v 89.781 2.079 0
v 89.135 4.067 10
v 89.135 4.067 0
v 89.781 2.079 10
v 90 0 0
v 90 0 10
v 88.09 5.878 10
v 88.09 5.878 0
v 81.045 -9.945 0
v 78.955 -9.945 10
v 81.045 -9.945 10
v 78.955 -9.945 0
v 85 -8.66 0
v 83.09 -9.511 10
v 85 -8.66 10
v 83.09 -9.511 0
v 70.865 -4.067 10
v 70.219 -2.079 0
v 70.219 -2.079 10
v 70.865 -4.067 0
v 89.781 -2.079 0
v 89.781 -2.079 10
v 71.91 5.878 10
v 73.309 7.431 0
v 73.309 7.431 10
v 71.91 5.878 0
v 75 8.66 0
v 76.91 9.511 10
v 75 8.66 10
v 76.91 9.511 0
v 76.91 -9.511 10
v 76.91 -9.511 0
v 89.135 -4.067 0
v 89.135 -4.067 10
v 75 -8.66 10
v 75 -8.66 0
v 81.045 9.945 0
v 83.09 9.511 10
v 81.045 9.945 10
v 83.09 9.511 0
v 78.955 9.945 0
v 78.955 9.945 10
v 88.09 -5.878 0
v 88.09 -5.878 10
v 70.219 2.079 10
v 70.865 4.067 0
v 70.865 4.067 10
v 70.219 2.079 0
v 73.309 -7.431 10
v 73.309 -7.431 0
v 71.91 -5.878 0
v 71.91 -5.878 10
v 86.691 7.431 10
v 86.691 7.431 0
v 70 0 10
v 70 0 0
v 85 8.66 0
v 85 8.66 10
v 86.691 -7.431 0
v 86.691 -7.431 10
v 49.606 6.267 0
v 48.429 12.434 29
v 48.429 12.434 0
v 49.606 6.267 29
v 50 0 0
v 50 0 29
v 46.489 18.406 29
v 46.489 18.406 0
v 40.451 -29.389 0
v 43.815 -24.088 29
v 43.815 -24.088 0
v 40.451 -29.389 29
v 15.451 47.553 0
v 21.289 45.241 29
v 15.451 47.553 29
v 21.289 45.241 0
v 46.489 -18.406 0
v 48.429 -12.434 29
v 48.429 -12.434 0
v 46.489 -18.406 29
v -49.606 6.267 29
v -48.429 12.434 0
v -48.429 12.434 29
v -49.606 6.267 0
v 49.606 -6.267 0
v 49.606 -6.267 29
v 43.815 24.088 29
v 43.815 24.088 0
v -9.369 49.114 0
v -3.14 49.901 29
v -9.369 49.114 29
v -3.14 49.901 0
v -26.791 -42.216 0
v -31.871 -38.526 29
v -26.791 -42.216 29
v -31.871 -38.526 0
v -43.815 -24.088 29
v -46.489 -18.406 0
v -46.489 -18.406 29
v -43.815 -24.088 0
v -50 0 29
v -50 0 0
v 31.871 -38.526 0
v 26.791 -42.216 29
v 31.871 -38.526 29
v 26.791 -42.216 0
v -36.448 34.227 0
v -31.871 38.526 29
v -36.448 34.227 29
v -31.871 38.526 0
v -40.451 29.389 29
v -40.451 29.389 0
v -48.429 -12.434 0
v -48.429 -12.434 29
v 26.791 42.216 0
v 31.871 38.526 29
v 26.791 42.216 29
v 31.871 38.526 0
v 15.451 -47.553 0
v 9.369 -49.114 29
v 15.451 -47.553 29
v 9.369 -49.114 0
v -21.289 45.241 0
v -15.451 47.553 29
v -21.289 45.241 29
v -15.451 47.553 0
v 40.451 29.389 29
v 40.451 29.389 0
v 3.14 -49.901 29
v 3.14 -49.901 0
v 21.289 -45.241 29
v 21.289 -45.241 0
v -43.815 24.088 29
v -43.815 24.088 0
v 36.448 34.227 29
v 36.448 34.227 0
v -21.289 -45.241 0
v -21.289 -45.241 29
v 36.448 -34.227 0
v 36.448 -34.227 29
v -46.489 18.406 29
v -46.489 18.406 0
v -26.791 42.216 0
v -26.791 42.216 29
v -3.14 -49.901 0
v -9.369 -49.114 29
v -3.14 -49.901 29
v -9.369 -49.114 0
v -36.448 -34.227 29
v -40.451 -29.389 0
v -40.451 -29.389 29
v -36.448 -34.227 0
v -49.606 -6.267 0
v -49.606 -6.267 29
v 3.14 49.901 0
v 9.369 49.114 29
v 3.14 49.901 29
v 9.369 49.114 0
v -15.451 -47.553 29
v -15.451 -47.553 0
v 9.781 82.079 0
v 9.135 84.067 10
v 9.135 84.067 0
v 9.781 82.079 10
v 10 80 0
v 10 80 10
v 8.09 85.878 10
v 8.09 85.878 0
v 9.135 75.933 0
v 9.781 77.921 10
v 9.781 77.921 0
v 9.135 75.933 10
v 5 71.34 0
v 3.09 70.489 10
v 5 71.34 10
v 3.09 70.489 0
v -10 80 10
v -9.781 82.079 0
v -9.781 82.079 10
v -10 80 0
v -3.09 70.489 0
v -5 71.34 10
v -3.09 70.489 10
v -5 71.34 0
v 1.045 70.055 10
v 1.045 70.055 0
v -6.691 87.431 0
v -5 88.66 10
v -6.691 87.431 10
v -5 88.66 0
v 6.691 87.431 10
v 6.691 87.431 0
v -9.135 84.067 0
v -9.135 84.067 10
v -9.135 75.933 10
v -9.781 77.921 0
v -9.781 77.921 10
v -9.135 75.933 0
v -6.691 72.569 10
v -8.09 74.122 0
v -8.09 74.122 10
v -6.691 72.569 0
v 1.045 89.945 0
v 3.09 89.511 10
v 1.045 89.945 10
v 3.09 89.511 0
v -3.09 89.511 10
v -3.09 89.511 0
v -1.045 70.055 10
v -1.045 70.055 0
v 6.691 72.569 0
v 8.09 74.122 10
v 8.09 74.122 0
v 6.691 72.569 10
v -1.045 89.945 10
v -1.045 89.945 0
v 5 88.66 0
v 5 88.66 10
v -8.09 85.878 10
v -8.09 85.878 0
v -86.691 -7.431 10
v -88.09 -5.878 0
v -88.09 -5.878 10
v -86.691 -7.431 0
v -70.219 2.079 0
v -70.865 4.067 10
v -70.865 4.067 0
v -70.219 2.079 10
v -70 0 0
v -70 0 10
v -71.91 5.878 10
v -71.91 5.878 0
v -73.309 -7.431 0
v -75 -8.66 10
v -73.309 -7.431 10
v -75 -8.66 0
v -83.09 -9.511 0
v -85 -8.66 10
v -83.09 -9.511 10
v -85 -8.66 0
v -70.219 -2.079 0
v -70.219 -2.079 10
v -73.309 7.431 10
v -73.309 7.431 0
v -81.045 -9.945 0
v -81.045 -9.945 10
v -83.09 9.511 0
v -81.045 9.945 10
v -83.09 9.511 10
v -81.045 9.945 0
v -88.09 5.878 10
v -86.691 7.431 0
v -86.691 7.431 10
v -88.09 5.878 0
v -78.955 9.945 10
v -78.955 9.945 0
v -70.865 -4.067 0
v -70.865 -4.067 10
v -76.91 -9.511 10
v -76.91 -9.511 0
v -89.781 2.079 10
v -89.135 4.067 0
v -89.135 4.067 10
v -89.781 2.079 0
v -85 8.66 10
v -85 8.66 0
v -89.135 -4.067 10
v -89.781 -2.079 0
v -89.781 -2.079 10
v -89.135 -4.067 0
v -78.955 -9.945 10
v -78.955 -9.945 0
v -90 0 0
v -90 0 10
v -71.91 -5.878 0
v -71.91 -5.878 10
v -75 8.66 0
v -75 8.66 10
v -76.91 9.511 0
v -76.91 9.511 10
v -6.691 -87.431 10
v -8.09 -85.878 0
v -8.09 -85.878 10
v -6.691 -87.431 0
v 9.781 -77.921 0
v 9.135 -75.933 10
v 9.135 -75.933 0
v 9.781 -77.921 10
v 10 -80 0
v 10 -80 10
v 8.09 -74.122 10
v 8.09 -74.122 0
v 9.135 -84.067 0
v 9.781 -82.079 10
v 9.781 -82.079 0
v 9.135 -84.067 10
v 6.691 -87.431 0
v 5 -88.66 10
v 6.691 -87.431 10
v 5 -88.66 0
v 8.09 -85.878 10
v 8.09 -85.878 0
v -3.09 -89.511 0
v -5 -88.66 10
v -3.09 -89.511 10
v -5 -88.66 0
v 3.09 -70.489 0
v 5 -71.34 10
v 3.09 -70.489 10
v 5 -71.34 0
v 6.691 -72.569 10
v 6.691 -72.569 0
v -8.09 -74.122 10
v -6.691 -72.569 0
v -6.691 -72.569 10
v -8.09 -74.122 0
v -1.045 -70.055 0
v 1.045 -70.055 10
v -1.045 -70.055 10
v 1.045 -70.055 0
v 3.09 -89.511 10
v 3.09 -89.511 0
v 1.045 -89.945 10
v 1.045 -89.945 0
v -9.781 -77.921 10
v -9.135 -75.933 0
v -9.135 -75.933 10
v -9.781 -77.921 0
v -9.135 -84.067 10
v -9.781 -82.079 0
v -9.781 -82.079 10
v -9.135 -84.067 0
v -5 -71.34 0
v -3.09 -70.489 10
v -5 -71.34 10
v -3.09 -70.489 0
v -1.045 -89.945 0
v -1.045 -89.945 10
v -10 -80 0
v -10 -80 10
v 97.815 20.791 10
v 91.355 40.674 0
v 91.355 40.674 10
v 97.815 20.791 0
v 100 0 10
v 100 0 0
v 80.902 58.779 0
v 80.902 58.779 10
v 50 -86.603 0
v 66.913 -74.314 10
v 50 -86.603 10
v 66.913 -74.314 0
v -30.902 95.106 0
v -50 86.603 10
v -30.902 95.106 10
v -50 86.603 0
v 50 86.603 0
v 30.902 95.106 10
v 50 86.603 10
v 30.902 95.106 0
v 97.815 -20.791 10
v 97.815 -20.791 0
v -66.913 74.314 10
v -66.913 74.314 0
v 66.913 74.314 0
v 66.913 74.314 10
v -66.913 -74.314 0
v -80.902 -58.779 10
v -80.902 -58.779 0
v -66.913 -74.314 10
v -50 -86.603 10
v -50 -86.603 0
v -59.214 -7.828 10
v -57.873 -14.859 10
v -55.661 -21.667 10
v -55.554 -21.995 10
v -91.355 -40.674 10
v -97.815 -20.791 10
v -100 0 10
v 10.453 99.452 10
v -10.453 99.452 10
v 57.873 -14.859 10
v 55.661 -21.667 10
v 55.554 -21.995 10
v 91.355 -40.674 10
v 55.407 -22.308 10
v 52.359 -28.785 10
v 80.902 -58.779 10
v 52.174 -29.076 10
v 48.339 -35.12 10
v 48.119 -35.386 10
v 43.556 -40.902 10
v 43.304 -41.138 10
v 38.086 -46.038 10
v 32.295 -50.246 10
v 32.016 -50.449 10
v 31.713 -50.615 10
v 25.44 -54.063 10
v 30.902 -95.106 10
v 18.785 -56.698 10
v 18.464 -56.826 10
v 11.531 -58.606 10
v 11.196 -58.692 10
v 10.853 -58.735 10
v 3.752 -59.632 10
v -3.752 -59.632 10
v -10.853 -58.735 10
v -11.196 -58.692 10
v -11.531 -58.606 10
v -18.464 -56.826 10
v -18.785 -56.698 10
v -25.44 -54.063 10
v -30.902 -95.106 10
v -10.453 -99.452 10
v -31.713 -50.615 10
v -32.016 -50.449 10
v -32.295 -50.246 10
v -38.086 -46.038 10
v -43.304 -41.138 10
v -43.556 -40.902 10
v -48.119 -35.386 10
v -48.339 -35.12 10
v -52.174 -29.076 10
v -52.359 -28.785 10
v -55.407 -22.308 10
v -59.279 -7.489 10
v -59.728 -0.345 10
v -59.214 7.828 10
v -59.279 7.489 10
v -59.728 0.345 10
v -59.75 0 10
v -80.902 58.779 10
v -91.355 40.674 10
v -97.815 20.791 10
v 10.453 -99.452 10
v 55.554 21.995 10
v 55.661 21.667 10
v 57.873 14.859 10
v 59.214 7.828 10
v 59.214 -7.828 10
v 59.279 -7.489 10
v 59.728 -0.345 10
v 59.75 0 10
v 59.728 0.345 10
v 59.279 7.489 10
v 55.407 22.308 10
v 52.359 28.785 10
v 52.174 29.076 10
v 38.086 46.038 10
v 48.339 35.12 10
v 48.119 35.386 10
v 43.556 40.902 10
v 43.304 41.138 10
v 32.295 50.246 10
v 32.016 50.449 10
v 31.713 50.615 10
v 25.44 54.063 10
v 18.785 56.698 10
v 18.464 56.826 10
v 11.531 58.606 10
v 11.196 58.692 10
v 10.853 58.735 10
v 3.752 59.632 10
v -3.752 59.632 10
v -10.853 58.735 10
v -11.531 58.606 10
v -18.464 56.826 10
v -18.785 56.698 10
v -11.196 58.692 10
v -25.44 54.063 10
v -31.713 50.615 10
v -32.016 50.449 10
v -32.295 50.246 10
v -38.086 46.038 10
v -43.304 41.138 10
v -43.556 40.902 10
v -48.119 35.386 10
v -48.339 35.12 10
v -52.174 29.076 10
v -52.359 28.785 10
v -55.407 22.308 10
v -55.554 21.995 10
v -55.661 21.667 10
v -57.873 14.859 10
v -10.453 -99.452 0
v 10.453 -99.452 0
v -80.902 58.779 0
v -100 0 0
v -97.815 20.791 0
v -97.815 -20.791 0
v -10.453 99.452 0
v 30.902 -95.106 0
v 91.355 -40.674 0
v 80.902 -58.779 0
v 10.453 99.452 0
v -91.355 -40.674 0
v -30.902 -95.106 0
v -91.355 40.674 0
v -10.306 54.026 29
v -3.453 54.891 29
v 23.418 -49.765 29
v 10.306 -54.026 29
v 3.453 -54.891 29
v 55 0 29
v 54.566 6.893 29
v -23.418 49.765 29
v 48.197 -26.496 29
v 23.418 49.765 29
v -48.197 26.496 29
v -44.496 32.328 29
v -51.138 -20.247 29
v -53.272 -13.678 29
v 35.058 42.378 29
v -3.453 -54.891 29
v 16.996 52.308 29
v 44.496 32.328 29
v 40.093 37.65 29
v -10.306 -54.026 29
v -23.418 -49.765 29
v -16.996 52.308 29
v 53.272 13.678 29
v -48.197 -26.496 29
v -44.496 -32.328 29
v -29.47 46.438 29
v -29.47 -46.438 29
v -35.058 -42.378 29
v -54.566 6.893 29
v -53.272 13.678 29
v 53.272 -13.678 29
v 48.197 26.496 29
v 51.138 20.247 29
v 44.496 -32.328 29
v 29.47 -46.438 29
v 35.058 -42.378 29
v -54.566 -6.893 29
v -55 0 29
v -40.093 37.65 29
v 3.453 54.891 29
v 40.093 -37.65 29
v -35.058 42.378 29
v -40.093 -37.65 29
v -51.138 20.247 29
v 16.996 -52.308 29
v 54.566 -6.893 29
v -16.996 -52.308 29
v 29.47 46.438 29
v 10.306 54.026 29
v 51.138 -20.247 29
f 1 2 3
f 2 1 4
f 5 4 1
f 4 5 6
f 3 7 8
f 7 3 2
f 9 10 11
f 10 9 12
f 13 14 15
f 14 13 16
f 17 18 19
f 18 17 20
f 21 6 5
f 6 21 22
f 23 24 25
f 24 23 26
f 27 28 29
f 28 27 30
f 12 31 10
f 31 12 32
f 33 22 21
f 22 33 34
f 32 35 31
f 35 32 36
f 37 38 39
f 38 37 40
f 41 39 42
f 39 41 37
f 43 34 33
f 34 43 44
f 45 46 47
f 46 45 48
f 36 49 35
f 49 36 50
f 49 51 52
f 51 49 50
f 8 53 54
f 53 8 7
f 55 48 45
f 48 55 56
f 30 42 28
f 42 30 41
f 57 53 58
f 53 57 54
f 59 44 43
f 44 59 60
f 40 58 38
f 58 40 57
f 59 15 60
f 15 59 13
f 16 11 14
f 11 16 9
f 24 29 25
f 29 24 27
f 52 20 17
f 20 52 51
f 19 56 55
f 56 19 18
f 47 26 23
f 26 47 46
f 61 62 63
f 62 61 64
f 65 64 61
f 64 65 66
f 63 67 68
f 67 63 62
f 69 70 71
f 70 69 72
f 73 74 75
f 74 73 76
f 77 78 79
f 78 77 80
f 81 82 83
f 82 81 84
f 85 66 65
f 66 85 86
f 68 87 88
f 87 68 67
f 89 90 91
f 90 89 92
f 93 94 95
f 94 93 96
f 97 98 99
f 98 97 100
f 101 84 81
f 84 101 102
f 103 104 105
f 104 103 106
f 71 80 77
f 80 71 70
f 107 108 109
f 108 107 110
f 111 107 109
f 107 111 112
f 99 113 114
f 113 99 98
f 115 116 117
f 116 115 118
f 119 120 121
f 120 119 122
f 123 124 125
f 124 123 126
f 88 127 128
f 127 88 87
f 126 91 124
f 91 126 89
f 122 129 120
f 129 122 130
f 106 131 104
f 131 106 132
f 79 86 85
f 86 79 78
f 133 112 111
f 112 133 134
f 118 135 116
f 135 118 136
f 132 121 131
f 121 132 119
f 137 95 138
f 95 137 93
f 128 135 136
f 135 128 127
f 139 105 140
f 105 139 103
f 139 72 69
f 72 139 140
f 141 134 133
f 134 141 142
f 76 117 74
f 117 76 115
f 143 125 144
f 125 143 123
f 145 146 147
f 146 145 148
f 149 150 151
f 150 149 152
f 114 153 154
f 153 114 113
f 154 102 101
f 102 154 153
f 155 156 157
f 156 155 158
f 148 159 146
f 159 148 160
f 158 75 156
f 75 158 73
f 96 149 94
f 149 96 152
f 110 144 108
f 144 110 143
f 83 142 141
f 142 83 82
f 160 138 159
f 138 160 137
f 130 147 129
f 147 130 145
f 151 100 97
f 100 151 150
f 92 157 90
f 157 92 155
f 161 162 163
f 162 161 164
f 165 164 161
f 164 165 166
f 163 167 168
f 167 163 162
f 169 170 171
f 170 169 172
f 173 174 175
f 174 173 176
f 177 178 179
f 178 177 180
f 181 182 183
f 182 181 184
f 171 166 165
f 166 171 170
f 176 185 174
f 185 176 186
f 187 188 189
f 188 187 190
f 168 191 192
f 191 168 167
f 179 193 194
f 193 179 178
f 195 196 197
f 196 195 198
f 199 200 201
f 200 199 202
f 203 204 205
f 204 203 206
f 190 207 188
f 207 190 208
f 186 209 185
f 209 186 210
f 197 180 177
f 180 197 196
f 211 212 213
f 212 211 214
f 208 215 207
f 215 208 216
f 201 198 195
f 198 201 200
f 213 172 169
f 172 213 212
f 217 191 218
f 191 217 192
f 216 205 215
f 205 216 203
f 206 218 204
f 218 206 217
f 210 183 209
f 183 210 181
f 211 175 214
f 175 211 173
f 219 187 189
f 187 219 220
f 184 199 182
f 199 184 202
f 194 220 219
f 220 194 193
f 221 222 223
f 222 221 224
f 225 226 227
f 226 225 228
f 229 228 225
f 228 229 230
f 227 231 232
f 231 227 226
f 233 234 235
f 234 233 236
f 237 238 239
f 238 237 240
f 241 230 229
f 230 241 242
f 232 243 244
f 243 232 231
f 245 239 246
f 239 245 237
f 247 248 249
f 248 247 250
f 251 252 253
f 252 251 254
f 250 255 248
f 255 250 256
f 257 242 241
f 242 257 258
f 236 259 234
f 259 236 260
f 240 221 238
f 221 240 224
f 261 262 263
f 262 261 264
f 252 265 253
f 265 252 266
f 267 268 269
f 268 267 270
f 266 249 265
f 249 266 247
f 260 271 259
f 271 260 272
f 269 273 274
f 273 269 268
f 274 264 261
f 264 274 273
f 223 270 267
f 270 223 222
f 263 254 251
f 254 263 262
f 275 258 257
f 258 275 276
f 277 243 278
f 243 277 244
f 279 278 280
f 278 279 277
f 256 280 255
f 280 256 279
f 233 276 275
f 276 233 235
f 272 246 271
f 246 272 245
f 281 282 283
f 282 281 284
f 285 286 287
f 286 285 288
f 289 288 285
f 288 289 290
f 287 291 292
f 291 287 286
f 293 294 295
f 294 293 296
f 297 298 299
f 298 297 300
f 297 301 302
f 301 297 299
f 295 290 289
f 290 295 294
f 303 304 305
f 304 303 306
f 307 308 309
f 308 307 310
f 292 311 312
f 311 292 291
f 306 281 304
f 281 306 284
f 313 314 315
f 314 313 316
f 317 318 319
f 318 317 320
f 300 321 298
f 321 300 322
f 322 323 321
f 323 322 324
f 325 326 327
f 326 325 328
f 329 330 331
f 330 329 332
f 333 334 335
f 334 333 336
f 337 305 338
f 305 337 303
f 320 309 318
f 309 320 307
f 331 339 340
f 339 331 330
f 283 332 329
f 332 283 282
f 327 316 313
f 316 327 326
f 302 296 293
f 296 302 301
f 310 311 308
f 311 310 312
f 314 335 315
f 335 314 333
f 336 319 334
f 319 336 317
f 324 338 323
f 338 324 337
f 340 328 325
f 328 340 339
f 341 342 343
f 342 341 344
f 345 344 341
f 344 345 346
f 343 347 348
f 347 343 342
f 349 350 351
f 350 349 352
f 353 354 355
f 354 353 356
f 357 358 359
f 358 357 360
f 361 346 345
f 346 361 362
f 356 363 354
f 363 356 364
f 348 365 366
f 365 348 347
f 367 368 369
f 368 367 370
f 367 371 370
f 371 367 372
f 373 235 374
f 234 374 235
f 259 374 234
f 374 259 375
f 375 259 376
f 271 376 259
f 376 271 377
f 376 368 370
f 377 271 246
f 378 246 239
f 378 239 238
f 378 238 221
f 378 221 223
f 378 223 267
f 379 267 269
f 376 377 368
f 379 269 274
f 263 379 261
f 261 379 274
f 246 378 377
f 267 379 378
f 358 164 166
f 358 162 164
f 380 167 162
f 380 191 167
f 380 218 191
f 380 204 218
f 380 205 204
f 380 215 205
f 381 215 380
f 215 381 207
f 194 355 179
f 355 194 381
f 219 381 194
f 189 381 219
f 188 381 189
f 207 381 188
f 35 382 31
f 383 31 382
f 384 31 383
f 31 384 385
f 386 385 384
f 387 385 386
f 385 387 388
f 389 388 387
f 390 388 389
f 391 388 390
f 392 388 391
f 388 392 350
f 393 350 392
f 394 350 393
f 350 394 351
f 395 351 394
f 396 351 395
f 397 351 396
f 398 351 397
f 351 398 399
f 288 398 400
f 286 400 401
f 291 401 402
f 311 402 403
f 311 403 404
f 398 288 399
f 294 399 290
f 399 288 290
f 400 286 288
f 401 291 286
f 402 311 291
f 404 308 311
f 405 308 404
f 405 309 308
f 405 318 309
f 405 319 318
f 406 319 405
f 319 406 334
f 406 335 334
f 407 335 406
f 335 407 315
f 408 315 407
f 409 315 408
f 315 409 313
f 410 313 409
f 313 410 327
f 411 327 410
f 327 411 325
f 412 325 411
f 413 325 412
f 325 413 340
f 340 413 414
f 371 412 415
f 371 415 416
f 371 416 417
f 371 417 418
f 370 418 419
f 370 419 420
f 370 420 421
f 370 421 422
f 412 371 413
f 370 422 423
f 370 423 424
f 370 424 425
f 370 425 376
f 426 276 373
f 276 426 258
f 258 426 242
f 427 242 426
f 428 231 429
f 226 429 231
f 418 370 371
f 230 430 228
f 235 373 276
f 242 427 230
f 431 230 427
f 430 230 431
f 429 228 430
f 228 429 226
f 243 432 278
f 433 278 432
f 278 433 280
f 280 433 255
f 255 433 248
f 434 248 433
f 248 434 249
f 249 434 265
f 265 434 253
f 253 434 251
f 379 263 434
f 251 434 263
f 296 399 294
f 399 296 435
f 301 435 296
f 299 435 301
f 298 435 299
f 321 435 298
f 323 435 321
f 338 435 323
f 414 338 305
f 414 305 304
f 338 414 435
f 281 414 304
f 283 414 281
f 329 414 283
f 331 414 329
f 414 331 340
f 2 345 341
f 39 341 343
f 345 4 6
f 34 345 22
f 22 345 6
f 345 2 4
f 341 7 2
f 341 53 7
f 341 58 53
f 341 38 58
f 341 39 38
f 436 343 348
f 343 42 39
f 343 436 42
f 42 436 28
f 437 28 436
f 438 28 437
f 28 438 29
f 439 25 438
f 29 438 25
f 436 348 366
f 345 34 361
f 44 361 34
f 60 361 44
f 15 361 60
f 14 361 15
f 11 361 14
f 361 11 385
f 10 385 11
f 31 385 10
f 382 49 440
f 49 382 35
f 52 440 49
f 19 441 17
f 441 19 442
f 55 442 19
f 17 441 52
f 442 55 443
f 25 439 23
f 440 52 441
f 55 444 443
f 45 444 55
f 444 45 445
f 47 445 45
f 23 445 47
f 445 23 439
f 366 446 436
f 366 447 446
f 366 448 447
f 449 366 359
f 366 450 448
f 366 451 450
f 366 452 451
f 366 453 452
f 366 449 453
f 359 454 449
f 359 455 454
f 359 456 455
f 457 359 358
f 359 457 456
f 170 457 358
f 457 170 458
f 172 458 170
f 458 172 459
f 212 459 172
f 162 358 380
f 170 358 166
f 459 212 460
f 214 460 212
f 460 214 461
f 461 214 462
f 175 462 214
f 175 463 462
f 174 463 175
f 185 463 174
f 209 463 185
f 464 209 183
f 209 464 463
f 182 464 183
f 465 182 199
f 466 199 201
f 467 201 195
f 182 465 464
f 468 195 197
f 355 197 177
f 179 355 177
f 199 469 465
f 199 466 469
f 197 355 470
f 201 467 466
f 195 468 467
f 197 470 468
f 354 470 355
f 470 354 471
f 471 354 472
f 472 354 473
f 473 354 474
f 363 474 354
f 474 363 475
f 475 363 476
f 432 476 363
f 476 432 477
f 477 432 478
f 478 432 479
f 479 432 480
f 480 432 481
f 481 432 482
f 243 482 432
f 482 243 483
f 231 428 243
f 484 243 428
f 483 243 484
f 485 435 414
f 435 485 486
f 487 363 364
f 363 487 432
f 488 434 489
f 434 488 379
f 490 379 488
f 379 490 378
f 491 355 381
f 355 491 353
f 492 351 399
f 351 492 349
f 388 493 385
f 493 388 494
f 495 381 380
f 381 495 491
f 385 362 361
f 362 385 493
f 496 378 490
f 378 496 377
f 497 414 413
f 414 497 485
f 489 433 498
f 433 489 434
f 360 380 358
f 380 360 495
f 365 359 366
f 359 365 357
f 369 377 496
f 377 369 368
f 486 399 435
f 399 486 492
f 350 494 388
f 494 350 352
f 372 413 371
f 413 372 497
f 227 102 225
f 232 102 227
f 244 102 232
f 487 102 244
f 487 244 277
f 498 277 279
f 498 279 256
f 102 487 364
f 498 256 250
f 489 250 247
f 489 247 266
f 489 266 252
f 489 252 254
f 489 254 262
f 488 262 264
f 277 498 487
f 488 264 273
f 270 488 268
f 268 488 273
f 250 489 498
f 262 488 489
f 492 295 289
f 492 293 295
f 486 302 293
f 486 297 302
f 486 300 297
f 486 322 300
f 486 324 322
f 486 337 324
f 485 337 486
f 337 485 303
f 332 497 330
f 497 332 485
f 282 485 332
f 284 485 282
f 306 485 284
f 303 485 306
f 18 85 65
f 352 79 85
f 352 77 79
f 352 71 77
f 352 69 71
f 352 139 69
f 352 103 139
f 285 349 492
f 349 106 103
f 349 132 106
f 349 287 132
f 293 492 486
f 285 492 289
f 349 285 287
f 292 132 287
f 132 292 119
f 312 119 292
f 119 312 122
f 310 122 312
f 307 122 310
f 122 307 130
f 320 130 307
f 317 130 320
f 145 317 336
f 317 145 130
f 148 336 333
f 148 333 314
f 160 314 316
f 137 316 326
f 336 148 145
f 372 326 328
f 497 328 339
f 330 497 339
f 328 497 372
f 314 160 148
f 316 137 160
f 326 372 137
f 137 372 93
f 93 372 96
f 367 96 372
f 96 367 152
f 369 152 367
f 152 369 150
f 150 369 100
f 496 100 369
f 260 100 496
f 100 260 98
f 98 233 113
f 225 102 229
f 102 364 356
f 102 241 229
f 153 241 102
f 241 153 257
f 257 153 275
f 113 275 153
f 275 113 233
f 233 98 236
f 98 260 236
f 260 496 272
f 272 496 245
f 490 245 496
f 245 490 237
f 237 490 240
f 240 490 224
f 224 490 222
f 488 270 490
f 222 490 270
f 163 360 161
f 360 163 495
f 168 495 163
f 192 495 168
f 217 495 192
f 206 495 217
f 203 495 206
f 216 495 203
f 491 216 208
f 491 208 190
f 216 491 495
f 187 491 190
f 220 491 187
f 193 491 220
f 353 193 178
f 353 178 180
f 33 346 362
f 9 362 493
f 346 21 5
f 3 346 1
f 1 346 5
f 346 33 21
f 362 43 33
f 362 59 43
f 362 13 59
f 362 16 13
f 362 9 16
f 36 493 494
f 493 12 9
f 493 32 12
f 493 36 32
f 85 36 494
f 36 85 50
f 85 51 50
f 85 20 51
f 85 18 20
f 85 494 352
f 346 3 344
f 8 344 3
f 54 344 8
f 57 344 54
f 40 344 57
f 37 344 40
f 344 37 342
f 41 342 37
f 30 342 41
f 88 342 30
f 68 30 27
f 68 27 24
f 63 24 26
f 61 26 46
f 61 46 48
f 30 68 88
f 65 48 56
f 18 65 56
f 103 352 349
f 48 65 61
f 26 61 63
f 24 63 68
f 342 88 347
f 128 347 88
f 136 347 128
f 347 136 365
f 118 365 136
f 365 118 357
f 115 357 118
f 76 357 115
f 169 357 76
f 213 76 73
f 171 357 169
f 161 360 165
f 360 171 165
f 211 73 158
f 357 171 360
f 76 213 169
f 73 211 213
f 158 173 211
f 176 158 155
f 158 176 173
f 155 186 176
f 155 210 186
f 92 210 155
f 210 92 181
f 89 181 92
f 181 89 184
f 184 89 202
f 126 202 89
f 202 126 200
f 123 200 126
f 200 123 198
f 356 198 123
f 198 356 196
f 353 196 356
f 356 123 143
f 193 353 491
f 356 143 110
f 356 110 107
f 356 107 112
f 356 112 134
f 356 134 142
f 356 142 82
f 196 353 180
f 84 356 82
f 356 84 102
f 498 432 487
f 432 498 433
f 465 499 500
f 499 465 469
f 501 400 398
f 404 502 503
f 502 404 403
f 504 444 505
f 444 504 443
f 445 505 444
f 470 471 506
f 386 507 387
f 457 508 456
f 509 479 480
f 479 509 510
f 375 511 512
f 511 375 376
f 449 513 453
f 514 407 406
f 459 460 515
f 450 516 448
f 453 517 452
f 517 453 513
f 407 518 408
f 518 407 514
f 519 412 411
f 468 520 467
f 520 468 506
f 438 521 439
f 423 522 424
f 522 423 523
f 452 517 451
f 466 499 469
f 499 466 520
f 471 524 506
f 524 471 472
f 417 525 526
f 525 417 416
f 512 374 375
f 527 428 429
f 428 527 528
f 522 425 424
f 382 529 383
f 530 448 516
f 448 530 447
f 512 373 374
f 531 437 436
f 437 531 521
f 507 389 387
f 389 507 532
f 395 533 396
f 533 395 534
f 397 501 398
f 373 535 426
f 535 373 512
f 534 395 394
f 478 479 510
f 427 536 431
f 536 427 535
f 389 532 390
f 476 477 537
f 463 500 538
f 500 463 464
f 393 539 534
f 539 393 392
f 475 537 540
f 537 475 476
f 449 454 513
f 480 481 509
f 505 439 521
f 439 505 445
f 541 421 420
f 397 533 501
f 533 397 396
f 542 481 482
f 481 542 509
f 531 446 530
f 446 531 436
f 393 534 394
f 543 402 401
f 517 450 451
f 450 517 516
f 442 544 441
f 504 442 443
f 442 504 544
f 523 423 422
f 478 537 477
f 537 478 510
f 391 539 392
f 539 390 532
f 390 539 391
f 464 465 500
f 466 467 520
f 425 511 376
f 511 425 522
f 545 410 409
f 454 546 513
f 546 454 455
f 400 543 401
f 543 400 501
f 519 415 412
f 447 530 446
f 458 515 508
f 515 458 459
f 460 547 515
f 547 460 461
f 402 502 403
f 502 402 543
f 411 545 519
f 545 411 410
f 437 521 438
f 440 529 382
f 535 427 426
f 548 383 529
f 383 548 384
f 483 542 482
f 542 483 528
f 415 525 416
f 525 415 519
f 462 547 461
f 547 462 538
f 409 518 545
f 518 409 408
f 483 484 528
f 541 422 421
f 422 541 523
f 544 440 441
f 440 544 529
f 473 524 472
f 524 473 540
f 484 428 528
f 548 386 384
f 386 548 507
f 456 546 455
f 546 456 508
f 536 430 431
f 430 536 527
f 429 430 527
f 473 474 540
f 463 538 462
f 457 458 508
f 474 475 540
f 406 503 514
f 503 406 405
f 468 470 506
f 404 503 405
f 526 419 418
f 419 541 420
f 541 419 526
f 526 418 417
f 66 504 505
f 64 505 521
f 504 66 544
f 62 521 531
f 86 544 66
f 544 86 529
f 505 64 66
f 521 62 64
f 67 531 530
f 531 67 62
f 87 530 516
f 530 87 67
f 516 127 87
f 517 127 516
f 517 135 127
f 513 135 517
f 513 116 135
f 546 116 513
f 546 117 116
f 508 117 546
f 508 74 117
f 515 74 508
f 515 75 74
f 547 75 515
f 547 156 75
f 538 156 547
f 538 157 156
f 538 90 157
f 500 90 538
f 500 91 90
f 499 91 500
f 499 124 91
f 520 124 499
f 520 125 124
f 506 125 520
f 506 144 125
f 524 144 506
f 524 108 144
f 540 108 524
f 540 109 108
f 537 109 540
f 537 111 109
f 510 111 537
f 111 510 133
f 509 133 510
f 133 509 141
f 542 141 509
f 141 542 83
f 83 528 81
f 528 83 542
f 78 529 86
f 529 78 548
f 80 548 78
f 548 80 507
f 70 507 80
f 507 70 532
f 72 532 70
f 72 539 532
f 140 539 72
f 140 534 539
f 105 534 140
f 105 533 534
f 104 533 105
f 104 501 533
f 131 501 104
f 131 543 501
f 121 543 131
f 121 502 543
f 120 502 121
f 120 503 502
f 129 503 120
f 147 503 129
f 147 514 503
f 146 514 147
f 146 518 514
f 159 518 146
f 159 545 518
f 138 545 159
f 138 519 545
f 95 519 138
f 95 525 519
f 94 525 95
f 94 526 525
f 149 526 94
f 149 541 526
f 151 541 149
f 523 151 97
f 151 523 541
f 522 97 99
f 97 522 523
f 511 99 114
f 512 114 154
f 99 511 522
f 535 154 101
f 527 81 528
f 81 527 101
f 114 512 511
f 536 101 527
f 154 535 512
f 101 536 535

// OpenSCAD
union(){


difference(){
cylinder(10,100,100,$fn=30);

r = 80;
for (i=[0:90:359]) {
    translate([r*cos(i),r*sin(i),-1])
        cylinder(12,10,10,$fn=30);
 
 translate([0,0,-1]) 
 cylinder(12,50,50,$fn=50);  

}

}

difference(){

translate([0,0,9]) 
cylinder(20,60,55,$fn=50);


translate([0,0,8]) 
cylinder(30,50,50,$fn=50);

}

}
